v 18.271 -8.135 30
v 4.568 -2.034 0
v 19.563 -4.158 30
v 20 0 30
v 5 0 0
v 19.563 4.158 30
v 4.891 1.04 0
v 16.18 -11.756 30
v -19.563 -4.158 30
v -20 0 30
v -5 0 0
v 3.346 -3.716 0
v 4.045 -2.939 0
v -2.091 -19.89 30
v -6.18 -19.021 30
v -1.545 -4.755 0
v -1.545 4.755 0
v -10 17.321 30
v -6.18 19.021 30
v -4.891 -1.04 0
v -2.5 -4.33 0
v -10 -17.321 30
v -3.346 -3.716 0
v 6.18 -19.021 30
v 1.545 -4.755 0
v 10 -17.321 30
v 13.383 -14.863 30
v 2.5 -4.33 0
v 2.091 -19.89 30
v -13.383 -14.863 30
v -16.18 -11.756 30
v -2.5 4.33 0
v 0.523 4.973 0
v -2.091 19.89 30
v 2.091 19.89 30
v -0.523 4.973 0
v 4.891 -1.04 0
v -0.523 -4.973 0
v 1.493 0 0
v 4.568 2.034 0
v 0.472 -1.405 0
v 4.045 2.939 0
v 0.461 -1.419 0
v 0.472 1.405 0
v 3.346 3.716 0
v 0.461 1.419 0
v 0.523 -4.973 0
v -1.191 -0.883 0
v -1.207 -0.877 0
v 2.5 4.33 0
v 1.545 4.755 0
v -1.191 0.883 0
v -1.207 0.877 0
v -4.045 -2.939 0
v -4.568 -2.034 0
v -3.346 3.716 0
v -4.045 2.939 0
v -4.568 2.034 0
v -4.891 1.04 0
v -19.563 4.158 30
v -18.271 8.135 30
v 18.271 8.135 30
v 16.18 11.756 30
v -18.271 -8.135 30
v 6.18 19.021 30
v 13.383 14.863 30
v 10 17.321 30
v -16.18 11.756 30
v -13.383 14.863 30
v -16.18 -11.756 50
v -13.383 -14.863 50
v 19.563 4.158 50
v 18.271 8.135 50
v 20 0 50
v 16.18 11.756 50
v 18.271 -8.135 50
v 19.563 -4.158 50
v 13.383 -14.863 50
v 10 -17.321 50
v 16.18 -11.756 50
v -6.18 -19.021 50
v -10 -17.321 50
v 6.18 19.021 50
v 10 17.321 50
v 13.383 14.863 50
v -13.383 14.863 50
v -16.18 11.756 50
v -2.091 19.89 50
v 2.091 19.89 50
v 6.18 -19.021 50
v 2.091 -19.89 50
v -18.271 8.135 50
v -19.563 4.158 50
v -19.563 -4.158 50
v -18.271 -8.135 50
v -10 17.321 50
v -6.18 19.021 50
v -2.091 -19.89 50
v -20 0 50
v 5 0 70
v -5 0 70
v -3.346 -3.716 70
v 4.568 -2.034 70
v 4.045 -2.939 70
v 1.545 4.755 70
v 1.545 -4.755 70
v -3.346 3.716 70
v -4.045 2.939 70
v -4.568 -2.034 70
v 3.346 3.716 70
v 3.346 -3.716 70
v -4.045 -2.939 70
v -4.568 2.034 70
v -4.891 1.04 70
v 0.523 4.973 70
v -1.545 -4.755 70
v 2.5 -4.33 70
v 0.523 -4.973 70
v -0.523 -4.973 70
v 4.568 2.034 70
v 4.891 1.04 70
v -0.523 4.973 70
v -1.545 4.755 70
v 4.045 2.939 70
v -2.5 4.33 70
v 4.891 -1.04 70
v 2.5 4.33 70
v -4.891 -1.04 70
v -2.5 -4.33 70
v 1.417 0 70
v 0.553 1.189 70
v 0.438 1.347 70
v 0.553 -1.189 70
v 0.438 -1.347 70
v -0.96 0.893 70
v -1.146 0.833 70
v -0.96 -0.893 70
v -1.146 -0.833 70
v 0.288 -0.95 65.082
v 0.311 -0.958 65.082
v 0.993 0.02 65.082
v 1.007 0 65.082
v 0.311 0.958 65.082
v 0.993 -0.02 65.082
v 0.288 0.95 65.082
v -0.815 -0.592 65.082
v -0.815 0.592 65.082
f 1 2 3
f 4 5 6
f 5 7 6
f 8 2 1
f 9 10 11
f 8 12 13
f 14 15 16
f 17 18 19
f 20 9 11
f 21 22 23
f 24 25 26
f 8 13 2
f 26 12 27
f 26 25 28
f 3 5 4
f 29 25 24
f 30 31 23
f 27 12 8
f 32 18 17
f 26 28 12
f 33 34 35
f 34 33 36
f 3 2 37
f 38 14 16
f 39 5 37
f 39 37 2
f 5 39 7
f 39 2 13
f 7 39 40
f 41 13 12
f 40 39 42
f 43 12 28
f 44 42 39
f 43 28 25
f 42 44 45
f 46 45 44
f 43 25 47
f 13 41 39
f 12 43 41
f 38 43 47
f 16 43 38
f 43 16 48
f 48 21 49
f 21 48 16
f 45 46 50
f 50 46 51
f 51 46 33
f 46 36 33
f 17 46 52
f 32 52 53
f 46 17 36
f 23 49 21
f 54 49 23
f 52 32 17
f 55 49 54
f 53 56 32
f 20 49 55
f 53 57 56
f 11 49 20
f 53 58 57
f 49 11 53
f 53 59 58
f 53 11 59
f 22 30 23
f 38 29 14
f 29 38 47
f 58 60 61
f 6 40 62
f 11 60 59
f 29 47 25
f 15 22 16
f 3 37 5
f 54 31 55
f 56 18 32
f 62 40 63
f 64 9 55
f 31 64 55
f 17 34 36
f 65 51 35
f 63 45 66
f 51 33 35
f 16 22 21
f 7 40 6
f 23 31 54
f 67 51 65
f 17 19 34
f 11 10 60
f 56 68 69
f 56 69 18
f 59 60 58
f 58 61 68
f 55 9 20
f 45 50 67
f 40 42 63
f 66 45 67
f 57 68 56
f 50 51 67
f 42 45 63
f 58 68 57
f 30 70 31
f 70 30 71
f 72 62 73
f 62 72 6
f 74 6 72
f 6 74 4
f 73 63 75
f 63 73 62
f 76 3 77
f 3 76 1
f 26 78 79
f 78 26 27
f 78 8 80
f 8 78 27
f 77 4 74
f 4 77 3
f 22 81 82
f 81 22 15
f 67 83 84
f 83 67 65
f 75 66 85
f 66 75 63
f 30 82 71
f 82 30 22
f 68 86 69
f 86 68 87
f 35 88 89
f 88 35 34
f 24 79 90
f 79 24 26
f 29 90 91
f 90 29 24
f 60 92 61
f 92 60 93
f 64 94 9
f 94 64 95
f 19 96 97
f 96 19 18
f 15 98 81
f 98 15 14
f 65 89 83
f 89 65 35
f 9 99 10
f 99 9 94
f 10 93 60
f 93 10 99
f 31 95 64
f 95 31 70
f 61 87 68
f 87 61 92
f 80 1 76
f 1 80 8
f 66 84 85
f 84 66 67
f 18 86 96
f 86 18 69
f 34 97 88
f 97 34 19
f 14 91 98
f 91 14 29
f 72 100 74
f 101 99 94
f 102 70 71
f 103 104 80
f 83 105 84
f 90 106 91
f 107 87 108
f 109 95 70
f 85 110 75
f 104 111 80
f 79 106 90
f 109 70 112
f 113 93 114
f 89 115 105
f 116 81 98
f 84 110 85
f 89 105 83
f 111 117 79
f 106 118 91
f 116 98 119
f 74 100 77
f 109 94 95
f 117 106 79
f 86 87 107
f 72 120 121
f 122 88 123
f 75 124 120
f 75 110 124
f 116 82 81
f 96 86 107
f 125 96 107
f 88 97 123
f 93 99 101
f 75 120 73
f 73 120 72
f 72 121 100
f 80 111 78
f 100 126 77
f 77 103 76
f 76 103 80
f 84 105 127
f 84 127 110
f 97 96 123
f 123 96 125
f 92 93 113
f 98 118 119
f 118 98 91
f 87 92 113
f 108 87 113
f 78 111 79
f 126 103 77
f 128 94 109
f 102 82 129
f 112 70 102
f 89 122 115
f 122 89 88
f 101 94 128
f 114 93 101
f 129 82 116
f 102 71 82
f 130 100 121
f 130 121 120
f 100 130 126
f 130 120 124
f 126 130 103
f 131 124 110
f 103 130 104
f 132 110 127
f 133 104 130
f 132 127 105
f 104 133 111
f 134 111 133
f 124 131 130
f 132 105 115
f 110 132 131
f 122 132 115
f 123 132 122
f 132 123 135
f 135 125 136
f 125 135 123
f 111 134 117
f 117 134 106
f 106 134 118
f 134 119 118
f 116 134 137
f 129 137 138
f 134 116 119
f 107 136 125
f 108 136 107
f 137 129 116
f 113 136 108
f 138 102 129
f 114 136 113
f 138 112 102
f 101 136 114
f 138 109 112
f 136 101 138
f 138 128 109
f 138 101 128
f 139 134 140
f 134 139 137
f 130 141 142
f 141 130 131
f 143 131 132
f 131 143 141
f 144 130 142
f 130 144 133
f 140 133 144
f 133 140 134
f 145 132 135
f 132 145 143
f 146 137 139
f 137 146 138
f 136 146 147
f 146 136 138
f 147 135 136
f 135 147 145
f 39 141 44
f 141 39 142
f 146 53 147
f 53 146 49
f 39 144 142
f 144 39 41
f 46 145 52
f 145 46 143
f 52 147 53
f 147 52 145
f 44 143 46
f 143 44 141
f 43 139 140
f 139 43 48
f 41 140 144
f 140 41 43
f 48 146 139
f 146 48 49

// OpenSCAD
module dobber();
//rubber dia 3 midd
//rubber dia 1.5 end
//rubber len 4.5
{
    difference()
 {
   union()
  {
difference()
 {
	union()
  {
		translate([0,0,0])
	cylinder(h=30,r1=5,r2=20,center=false);
		translate([0,0,30])
	cylinder(h=20,r1=20,r2=20,center=false);
		translate([0,0,50])
	cylinder(h=20,r1=20,r2=5,center=false);
    }
 }
 //
 }
 
 	union()
  {
    //4 gat
              translate([0,0,65])
    cylinder(h=6,r1=1,r2=1.5,center=false);
        translate([0,0,-1])
    cylinder(h=67,r1=1.5,r2=1,center=false);
  }
  }
}
